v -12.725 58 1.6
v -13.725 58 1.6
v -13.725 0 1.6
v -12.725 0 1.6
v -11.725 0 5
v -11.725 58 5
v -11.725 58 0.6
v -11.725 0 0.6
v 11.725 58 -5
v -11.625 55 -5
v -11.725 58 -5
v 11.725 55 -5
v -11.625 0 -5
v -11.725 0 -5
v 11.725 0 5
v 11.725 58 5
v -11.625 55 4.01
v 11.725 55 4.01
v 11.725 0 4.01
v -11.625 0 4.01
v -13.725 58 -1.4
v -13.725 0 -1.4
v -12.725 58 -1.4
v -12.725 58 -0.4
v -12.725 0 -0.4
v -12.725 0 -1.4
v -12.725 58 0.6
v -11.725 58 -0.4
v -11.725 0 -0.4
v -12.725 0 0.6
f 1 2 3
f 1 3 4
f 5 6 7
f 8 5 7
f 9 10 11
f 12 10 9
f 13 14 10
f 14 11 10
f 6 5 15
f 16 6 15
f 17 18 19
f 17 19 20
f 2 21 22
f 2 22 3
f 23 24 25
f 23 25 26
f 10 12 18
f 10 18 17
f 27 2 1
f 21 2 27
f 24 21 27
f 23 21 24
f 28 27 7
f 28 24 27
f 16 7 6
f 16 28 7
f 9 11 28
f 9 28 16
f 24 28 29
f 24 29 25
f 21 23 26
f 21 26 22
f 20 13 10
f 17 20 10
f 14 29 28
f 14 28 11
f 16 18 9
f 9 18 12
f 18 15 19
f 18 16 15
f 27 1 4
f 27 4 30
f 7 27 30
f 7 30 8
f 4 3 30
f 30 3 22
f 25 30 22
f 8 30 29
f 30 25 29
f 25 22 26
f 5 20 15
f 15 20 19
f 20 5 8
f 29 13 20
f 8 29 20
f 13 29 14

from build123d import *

# Parameters (mm, degrees)
SKETCH_1_W          = 23.45
SKETCH_1_H          = 10
EXTRUDE_1_DEPTH     = 58
EXTRUDE_2_DEPTH     = 58
SKETCH_5_W          = 23.35
SKETCH_5_H          = 55
CUT_EXTRUDE_2_DEPTH = 9.01


with BuildPart() as part:
    # 草圖1 → 填料-伸長1 (new body)
    with BuildSketch(Plane(origin=(0, 0, 0), x_dir=(1, 0, 0), z_dir=(0, 1, 0))):
        Rectangle(SKETCH_1_W, SKETCH_1_H)
    extrude(amount=EXTRUDE_1_DEPTH)

    # 草圖3 → 填料-伸長2 (add)
    with BuildSketch(Plane(origin=(0, 58, 0), x_dir=(1, 0, 0), z_dir=(0, 1, 0))):
        Polygon((-11.725, 0.4), (-12.725, 0.4), (-12.725, 1.4), (-13.725, 1.4), (-13.725, -1.60013631), (-12.725, -1.60013631), (-12.725, -0.6), (-11.725, -0.6), align=None)
    extrude(amount=-EXTRUDE_2_DEPTH)

    # 草圖5 → 除料-伸長2 (cut)
    with BuildSketch(Plane(origin=(0, 0, -5), x_dir=(-1, 0, 0), z_dir=(0, 0, -1))):
        with Locations((-0.05, 27.5)):
            Rectangle(SKETCH_5_W, SKETCH_5_H)
    extrude(amount=-CUT_EXTRUDE_2_DEPTH, mode=Mode.SUBTRACT)


solid = part.part
